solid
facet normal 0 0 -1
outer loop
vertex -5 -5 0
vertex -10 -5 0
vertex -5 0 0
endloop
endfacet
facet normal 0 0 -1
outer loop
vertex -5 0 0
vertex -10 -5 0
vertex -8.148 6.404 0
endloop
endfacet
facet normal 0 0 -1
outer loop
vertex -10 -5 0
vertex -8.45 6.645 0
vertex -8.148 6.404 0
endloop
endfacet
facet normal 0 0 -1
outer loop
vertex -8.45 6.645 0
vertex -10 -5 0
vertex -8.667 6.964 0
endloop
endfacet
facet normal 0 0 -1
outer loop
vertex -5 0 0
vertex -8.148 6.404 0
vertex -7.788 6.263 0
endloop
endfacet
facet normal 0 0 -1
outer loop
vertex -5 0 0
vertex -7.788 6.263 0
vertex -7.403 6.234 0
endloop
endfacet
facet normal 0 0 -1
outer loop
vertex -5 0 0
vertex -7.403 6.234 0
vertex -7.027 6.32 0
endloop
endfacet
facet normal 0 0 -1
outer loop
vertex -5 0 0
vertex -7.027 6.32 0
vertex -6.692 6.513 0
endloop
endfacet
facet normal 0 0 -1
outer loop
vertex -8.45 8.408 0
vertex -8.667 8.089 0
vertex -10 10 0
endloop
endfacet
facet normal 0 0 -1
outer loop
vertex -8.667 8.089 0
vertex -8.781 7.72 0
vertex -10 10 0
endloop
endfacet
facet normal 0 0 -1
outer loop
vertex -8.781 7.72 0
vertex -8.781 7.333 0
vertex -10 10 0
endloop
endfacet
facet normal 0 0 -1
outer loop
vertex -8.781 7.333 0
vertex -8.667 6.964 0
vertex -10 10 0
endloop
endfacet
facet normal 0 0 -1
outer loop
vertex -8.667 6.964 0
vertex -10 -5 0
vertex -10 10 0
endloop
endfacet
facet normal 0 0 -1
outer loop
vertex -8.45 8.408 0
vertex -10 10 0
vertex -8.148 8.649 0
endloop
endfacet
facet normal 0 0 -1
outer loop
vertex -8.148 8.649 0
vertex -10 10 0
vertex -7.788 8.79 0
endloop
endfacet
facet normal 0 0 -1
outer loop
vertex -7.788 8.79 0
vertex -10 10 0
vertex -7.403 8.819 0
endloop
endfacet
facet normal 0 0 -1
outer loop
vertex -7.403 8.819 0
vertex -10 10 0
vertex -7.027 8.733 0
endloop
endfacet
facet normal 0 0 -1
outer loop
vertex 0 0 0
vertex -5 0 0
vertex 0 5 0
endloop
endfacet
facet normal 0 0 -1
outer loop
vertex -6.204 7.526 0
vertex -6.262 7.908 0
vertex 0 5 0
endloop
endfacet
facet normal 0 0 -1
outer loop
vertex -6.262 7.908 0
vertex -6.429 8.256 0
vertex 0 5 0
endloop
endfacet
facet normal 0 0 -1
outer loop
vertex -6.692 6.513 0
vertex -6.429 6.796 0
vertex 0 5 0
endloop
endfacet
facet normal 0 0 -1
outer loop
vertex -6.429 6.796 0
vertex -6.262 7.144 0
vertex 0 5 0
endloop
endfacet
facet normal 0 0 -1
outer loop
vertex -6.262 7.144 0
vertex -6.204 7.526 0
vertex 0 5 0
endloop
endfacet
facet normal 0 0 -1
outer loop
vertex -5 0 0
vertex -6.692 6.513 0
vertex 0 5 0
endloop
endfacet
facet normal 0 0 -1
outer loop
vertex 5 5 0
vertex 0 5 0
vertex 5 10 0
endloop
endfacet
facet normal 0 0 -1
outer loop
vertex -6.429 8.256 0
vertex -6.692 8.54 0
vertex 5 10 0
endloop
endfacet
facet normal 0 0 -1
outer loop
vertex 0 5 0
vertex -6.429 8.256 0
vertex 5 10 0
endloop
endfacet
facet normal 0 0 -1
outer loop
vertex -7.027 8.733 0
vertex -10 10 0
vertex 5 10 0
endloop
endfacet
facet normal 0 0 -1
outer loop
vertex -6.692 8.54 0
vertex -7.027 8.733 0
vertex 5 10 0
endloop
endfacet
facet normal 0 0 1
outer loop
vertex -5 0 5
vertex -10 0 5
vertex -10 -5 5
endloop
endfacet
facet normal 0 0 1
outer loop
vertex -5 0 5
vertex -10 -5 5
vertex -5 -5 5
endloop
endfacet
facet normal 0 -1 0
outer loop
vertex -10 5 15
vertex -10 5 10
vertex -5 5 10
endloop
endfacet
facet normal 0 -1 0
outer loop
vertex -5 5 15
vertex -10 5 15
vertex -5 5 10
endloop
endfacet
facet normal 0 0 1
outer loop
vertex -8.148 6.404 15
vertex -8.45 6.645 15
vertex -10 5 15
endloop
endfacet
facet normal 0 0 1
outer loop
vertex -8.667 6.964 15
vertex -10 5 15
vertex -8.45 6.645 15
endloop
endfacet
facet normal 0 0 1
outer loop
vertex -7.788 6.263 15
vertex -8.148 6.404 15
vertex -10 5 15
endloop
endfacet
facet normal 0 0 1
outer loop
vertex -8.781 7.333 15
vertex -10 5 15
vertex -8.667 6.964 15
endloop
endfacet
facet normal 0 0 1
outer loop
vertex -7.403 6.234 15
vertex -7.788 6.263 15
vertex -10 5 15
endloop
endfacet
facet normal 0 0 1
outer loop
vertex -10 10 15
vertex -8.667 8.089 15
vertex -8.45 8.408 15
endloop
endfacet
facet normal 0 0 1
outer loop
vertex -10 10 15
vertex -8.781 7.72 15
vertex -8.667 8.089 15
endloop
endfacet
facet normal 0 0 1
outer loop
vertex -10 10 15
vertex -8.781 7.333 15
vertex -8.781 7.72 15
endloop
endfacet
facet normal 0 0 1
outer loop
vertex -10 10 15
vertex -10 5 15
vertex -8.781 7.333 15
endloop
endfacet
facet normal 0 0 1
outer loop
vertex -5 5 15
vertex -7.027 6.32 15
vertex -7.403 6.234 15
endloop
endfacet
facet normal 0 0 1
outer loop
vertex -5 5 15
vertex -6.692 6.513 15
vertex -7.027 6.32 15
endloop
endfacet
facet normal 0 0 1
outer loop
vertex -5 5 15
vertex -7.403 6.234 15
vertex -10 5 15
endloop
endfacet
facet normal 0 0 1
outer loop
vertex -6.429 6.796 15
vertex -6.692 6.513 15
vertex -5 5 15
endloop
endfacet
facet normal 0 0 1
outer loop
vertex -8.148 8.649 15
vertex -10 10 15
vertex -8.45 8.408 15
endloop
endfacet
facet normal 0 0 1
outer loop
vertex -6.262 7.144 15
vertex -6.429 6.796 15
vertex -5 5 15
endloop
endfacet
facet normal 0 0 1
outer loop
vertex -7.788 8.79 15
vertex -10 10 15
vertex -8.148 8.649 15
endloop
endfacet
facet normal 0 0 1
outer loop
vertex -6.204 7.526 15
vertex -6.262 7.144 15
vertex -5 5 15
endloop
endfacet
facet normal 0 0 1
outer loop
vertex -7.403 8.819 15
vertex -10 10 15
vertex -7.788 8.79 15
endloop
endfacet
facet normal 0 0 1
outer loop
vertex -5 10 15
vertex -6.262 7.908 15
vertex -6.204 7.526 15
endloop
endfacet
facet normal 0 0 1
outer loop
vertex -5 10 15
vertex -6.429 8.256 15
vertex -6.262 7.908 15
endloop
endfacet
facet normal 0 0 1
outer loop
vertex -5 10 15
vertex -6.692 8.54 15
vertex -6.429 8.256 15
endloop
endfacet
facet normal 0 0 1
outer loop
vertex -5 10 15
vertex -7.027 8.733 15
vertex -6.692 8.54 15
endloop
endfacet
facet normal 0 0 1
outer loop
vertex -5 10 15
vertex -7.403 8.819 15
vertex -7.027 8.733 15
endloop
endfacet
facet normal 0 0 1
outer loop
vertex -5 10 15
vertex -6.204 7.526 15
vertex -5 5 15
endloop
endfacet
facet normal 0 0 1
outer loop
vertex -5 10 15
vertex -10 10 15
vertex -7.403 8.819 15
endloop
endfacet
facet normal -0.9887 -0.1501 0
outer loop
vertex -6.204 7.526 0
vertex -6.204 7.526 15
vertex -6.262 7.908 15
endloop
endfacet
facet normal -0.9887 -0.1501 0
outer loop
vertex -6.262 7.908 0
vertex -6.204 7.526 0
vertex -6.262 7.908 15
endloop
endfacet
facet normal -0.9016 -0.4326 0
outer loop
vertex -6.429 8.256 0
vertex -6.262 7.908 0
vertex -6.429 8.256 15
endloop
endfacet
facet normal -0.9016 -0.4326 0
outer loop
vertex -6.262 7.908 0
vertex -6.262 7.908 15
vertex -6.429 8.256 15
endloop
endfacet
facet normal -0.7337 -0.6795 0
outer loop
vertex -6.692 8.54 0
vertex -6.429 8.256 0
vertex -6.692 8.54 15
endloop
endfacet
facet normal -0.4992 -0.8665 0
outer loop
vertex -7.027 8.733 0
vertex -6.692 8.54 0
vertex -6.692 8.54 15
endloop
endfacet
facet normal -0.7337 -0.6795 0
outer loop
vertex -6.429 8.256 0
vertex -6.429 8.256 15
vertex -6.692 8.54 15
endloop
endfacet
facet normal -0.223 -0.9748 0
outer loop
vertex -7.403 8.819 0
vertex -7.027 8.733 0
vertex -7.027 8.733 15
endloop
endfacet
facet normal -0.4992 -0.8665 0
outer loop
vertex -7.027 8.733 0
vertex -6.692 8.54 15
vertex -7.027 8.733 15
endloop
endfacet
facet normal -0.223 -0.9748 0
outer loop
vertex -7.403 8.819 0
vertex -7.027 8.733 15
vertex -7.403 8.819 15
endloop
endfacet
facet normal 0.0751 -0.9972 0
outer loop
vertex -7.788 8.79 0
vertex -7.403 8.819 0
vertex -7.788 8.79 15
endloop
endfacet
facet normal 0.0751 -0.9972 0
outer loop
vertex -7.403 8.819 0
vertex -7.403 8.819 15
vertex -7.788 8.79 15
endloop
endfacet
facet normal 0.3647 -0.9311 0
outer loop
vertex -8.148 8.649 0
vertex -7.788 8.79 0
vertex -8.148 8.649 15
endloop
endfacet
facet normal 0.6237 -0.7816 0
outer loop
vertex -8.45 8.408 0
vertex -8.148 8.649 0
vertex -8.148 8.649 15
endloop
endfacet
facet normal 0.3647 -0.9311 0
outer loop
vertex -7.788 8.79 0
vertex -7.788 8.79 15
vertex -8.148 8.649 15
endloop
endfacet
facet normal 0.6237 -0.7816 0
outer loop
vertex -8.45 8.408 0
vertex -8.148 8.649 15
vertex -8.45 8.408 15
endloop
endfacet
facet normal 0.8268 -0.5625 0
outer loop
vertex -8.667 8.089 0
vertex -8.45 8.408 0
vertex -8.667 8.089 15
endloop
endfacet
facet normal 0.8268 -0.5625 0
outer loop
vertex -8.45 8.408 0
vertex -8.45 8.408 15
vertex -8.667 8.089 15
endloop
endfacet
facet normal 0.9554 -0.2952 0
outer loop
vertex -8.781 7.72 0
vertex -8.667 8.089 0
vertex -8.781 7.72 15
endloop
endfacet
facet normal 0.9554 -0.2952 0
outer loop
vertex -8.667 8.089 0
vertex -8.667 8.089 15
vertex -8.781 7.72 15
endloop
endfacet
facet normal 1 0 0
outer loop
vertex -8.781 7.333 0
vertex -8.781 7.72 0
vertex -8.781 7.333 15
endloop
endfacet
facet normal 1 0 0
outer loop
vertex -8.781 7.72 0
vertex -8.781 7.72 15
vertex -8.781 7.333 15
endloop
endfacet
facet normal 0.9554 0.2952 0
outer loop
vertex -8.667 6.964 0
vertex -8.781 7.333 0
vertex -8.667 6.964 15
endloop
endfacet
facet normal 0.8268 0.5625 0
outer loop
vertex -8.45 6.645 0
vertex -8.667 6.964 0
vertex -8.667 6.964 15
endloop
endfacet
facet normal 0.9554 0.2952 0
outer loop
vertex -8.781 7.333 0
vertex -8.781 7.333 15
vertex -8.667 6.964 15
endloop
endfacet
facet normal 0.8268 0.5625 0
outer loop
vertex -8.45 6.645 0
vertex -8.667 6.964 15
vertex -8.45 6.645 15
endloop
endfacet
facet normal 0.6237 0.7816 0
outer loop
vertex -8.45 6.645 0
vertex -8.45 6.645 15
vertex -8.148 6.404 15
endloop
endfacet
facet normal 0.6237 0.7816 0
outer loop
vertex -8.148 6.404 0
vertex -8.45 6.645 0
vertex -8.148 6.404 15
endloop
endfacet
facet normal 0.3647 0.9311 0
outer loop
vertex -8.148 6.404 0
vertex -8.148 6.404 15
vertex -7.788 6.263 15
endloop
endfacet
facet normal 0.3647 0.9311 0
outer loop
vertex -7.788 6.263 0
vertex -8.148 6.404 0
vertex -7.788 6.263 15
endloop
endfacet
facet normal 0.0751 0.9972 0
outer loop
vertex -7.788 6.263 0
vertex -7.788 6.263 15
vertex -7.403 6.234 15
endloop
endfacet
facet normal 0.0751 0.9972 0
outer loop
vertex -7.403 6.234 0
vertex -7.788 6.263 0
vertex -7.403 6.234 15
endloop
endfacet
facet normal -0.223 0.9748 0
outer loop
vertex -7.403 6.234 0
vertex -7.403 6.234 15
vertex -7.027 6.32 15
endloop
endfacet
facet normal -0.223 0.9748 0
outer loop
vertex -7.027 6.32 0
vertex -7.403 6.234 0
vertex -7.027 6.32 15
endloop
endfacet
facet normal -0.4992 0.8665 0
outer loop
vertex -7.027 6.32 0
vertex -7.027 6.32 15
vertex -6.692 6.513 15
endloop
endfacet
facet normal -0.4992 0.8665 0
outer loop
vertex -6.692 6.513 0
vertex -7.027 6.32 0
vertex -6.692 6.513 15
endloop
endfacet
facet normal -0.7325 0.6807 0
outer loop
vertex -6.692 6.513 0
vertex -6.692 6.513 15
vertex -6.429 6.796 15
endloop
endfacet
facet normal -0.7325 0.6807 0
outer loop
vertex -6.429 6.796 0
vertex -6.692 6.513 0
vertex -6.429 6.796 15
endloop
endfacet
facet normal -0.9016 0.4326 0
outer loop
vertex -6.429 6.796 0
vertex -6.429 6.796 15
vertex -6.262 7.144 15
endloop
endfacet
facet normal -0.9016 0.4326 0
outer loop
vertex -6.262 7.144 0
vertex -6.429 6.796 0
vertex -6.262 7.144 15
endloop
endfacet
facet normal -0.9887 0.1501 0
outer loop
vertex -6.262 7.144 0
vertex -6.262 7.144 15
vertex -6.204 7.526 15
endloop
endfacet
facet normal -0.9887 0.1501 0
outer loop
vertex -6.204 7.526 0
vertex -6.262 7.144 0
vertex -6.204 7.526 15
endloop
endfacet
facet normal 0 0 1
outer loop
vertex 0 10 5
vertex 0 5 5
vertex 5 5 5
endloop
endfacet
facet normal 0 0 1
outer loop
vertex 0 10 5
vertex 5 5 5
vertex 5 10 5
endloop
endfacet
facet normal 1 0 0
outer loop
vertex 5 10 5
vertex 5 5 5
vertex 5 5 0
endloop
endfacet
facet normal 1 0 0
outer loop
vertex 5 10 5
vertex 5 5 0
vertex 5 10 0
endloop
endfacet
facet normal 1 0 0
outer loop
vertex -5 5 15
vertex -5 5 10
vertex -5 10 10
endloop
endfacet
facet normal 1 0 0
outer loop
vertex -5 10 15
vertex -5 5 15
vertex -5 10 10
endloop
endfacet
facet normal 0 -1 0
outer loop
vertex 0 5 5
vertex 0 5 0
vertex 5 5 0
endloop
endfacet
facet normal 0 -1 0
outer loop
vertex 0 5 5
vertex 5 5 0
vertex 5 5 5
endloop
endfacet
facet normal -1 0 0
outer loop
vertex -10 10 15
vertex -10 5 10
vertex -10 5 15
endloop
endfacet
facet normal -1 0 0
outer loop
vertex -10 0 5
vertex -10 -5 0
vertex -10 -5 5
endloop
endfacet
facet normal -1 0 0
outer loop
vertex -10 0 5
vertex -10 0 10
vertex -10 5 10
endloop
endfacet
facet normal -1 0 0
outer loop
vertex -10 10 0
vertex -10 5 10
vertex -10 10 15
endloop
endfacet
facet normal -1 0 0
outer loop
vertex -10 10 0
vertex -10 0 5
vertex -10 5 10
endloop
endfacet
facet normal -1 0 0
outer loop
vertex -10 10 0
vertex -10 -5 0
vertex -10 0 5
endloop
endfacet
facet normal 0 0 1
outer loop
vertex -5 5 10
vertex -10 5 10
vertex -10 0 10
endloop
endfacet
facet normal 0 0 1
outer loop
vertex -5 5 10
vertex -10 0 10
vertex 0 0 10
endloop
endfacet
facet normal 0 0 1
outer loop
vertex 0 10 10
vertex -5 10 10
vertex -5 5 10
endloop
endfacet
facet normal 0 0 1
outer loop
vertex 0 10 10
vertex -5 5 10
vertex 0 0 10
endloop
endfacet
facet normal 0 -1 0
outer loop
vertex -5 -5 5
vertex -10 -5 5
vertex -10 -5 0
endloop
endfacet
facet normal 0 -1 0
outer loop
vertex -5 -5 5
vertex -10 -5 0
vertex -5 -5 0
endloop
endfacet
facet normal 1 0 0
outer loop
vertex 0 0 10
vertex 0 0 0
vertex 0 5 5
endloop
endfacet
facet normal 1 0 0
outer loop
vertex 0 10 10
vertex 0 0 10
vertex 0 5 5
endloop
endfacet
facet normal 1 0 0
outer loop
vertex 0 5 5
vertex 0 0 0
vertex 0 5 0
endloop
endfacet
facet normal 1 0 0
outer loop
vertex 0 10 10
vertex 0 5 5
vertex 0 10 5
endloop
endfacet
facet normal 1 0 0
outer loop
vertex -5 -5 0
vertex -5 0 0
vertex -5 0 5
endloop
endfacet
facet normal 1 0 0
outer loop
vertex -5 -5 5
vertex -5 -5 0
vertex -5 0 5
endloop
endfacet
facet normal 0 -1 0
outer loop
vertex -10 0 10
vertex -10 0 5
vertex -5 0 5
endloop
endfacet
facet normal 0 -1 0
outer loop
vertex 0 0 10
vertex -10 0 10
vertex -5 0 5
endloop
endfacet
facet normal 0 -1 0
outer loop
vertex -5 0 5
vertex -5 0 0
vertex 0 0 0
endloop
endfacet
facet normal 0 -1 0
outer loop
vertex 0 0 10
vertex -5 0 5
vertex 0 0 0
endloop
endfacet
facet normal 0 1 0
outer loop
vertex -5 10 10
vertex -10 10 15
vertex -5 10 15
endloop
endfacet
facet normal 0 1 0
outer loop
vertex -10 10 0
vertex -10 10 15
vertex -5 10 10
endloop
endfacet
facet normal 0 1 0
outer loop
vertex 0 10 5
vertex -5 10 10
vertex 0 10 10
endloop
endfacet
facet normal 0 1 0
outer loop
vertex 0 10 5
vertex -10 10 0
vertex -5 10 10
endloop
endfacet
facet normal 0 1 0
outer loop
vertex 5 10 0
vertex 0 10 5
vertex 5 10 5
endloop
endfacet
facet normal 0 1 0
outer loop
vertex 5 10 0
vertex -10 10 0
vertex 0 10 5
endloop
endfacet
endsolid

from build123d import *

# Parameters (mm, degrees)
F0_W     = 10
F0_H     = 10
F1_DEPTH = 10
F2_W     = 5
F2_H     = 5
F3_DEPTH = 5
F4_W     = 5
F4_H     = 5
F5_DEPTH = 5
F6_W     = 5
F6_H     = 5
F7_DEPTH = 5
F8_R     = 1.295802
F9_DEPTH = 25


with BuildPart() as f1:
    # F0 (on Top) → F1 (new body)
    with BuildSketch(Plane.XY):
        with Locations((-5, 5)):
            Rectangle(F0_W, F0_H)
    extrude(amount=F1_DEPTH)

    # F2 (on face) → F3 (join)
    with BuildSketch(Plane.YZ):
        with Locations((7.5, 2.5)):
            Rectangle(F2_W, F2_H)
    extrude(amount=F3_DEPTH)

    # F4 (on face) → F5 (join)
    with BuildSketch(Plane.XZ):
        with Locations((-7.5, 2.5)):
            Rectangle(F4_W, F4_H)
    extrude(amount=F5_DEPTH)

    # F6 (on face) → F7 (join)
    with BuildSketch(Plane.XY.offset(10)):
        with Locations((-7.5, 7.5)):
            Rectangle(F6_W, F6_H)
    extrude(amount=F7_DEPTH)

    # F8 (on face) → F9 (cut)
    with BuildSketch(Plane.XY.offset(15)):
        with Locations((-7.5, 7.526434)):
            Circle(F8_R)
    extrude(amount=-F9_DEPTH, mode=Mode.SUBTRACT)


solid = f1.part
